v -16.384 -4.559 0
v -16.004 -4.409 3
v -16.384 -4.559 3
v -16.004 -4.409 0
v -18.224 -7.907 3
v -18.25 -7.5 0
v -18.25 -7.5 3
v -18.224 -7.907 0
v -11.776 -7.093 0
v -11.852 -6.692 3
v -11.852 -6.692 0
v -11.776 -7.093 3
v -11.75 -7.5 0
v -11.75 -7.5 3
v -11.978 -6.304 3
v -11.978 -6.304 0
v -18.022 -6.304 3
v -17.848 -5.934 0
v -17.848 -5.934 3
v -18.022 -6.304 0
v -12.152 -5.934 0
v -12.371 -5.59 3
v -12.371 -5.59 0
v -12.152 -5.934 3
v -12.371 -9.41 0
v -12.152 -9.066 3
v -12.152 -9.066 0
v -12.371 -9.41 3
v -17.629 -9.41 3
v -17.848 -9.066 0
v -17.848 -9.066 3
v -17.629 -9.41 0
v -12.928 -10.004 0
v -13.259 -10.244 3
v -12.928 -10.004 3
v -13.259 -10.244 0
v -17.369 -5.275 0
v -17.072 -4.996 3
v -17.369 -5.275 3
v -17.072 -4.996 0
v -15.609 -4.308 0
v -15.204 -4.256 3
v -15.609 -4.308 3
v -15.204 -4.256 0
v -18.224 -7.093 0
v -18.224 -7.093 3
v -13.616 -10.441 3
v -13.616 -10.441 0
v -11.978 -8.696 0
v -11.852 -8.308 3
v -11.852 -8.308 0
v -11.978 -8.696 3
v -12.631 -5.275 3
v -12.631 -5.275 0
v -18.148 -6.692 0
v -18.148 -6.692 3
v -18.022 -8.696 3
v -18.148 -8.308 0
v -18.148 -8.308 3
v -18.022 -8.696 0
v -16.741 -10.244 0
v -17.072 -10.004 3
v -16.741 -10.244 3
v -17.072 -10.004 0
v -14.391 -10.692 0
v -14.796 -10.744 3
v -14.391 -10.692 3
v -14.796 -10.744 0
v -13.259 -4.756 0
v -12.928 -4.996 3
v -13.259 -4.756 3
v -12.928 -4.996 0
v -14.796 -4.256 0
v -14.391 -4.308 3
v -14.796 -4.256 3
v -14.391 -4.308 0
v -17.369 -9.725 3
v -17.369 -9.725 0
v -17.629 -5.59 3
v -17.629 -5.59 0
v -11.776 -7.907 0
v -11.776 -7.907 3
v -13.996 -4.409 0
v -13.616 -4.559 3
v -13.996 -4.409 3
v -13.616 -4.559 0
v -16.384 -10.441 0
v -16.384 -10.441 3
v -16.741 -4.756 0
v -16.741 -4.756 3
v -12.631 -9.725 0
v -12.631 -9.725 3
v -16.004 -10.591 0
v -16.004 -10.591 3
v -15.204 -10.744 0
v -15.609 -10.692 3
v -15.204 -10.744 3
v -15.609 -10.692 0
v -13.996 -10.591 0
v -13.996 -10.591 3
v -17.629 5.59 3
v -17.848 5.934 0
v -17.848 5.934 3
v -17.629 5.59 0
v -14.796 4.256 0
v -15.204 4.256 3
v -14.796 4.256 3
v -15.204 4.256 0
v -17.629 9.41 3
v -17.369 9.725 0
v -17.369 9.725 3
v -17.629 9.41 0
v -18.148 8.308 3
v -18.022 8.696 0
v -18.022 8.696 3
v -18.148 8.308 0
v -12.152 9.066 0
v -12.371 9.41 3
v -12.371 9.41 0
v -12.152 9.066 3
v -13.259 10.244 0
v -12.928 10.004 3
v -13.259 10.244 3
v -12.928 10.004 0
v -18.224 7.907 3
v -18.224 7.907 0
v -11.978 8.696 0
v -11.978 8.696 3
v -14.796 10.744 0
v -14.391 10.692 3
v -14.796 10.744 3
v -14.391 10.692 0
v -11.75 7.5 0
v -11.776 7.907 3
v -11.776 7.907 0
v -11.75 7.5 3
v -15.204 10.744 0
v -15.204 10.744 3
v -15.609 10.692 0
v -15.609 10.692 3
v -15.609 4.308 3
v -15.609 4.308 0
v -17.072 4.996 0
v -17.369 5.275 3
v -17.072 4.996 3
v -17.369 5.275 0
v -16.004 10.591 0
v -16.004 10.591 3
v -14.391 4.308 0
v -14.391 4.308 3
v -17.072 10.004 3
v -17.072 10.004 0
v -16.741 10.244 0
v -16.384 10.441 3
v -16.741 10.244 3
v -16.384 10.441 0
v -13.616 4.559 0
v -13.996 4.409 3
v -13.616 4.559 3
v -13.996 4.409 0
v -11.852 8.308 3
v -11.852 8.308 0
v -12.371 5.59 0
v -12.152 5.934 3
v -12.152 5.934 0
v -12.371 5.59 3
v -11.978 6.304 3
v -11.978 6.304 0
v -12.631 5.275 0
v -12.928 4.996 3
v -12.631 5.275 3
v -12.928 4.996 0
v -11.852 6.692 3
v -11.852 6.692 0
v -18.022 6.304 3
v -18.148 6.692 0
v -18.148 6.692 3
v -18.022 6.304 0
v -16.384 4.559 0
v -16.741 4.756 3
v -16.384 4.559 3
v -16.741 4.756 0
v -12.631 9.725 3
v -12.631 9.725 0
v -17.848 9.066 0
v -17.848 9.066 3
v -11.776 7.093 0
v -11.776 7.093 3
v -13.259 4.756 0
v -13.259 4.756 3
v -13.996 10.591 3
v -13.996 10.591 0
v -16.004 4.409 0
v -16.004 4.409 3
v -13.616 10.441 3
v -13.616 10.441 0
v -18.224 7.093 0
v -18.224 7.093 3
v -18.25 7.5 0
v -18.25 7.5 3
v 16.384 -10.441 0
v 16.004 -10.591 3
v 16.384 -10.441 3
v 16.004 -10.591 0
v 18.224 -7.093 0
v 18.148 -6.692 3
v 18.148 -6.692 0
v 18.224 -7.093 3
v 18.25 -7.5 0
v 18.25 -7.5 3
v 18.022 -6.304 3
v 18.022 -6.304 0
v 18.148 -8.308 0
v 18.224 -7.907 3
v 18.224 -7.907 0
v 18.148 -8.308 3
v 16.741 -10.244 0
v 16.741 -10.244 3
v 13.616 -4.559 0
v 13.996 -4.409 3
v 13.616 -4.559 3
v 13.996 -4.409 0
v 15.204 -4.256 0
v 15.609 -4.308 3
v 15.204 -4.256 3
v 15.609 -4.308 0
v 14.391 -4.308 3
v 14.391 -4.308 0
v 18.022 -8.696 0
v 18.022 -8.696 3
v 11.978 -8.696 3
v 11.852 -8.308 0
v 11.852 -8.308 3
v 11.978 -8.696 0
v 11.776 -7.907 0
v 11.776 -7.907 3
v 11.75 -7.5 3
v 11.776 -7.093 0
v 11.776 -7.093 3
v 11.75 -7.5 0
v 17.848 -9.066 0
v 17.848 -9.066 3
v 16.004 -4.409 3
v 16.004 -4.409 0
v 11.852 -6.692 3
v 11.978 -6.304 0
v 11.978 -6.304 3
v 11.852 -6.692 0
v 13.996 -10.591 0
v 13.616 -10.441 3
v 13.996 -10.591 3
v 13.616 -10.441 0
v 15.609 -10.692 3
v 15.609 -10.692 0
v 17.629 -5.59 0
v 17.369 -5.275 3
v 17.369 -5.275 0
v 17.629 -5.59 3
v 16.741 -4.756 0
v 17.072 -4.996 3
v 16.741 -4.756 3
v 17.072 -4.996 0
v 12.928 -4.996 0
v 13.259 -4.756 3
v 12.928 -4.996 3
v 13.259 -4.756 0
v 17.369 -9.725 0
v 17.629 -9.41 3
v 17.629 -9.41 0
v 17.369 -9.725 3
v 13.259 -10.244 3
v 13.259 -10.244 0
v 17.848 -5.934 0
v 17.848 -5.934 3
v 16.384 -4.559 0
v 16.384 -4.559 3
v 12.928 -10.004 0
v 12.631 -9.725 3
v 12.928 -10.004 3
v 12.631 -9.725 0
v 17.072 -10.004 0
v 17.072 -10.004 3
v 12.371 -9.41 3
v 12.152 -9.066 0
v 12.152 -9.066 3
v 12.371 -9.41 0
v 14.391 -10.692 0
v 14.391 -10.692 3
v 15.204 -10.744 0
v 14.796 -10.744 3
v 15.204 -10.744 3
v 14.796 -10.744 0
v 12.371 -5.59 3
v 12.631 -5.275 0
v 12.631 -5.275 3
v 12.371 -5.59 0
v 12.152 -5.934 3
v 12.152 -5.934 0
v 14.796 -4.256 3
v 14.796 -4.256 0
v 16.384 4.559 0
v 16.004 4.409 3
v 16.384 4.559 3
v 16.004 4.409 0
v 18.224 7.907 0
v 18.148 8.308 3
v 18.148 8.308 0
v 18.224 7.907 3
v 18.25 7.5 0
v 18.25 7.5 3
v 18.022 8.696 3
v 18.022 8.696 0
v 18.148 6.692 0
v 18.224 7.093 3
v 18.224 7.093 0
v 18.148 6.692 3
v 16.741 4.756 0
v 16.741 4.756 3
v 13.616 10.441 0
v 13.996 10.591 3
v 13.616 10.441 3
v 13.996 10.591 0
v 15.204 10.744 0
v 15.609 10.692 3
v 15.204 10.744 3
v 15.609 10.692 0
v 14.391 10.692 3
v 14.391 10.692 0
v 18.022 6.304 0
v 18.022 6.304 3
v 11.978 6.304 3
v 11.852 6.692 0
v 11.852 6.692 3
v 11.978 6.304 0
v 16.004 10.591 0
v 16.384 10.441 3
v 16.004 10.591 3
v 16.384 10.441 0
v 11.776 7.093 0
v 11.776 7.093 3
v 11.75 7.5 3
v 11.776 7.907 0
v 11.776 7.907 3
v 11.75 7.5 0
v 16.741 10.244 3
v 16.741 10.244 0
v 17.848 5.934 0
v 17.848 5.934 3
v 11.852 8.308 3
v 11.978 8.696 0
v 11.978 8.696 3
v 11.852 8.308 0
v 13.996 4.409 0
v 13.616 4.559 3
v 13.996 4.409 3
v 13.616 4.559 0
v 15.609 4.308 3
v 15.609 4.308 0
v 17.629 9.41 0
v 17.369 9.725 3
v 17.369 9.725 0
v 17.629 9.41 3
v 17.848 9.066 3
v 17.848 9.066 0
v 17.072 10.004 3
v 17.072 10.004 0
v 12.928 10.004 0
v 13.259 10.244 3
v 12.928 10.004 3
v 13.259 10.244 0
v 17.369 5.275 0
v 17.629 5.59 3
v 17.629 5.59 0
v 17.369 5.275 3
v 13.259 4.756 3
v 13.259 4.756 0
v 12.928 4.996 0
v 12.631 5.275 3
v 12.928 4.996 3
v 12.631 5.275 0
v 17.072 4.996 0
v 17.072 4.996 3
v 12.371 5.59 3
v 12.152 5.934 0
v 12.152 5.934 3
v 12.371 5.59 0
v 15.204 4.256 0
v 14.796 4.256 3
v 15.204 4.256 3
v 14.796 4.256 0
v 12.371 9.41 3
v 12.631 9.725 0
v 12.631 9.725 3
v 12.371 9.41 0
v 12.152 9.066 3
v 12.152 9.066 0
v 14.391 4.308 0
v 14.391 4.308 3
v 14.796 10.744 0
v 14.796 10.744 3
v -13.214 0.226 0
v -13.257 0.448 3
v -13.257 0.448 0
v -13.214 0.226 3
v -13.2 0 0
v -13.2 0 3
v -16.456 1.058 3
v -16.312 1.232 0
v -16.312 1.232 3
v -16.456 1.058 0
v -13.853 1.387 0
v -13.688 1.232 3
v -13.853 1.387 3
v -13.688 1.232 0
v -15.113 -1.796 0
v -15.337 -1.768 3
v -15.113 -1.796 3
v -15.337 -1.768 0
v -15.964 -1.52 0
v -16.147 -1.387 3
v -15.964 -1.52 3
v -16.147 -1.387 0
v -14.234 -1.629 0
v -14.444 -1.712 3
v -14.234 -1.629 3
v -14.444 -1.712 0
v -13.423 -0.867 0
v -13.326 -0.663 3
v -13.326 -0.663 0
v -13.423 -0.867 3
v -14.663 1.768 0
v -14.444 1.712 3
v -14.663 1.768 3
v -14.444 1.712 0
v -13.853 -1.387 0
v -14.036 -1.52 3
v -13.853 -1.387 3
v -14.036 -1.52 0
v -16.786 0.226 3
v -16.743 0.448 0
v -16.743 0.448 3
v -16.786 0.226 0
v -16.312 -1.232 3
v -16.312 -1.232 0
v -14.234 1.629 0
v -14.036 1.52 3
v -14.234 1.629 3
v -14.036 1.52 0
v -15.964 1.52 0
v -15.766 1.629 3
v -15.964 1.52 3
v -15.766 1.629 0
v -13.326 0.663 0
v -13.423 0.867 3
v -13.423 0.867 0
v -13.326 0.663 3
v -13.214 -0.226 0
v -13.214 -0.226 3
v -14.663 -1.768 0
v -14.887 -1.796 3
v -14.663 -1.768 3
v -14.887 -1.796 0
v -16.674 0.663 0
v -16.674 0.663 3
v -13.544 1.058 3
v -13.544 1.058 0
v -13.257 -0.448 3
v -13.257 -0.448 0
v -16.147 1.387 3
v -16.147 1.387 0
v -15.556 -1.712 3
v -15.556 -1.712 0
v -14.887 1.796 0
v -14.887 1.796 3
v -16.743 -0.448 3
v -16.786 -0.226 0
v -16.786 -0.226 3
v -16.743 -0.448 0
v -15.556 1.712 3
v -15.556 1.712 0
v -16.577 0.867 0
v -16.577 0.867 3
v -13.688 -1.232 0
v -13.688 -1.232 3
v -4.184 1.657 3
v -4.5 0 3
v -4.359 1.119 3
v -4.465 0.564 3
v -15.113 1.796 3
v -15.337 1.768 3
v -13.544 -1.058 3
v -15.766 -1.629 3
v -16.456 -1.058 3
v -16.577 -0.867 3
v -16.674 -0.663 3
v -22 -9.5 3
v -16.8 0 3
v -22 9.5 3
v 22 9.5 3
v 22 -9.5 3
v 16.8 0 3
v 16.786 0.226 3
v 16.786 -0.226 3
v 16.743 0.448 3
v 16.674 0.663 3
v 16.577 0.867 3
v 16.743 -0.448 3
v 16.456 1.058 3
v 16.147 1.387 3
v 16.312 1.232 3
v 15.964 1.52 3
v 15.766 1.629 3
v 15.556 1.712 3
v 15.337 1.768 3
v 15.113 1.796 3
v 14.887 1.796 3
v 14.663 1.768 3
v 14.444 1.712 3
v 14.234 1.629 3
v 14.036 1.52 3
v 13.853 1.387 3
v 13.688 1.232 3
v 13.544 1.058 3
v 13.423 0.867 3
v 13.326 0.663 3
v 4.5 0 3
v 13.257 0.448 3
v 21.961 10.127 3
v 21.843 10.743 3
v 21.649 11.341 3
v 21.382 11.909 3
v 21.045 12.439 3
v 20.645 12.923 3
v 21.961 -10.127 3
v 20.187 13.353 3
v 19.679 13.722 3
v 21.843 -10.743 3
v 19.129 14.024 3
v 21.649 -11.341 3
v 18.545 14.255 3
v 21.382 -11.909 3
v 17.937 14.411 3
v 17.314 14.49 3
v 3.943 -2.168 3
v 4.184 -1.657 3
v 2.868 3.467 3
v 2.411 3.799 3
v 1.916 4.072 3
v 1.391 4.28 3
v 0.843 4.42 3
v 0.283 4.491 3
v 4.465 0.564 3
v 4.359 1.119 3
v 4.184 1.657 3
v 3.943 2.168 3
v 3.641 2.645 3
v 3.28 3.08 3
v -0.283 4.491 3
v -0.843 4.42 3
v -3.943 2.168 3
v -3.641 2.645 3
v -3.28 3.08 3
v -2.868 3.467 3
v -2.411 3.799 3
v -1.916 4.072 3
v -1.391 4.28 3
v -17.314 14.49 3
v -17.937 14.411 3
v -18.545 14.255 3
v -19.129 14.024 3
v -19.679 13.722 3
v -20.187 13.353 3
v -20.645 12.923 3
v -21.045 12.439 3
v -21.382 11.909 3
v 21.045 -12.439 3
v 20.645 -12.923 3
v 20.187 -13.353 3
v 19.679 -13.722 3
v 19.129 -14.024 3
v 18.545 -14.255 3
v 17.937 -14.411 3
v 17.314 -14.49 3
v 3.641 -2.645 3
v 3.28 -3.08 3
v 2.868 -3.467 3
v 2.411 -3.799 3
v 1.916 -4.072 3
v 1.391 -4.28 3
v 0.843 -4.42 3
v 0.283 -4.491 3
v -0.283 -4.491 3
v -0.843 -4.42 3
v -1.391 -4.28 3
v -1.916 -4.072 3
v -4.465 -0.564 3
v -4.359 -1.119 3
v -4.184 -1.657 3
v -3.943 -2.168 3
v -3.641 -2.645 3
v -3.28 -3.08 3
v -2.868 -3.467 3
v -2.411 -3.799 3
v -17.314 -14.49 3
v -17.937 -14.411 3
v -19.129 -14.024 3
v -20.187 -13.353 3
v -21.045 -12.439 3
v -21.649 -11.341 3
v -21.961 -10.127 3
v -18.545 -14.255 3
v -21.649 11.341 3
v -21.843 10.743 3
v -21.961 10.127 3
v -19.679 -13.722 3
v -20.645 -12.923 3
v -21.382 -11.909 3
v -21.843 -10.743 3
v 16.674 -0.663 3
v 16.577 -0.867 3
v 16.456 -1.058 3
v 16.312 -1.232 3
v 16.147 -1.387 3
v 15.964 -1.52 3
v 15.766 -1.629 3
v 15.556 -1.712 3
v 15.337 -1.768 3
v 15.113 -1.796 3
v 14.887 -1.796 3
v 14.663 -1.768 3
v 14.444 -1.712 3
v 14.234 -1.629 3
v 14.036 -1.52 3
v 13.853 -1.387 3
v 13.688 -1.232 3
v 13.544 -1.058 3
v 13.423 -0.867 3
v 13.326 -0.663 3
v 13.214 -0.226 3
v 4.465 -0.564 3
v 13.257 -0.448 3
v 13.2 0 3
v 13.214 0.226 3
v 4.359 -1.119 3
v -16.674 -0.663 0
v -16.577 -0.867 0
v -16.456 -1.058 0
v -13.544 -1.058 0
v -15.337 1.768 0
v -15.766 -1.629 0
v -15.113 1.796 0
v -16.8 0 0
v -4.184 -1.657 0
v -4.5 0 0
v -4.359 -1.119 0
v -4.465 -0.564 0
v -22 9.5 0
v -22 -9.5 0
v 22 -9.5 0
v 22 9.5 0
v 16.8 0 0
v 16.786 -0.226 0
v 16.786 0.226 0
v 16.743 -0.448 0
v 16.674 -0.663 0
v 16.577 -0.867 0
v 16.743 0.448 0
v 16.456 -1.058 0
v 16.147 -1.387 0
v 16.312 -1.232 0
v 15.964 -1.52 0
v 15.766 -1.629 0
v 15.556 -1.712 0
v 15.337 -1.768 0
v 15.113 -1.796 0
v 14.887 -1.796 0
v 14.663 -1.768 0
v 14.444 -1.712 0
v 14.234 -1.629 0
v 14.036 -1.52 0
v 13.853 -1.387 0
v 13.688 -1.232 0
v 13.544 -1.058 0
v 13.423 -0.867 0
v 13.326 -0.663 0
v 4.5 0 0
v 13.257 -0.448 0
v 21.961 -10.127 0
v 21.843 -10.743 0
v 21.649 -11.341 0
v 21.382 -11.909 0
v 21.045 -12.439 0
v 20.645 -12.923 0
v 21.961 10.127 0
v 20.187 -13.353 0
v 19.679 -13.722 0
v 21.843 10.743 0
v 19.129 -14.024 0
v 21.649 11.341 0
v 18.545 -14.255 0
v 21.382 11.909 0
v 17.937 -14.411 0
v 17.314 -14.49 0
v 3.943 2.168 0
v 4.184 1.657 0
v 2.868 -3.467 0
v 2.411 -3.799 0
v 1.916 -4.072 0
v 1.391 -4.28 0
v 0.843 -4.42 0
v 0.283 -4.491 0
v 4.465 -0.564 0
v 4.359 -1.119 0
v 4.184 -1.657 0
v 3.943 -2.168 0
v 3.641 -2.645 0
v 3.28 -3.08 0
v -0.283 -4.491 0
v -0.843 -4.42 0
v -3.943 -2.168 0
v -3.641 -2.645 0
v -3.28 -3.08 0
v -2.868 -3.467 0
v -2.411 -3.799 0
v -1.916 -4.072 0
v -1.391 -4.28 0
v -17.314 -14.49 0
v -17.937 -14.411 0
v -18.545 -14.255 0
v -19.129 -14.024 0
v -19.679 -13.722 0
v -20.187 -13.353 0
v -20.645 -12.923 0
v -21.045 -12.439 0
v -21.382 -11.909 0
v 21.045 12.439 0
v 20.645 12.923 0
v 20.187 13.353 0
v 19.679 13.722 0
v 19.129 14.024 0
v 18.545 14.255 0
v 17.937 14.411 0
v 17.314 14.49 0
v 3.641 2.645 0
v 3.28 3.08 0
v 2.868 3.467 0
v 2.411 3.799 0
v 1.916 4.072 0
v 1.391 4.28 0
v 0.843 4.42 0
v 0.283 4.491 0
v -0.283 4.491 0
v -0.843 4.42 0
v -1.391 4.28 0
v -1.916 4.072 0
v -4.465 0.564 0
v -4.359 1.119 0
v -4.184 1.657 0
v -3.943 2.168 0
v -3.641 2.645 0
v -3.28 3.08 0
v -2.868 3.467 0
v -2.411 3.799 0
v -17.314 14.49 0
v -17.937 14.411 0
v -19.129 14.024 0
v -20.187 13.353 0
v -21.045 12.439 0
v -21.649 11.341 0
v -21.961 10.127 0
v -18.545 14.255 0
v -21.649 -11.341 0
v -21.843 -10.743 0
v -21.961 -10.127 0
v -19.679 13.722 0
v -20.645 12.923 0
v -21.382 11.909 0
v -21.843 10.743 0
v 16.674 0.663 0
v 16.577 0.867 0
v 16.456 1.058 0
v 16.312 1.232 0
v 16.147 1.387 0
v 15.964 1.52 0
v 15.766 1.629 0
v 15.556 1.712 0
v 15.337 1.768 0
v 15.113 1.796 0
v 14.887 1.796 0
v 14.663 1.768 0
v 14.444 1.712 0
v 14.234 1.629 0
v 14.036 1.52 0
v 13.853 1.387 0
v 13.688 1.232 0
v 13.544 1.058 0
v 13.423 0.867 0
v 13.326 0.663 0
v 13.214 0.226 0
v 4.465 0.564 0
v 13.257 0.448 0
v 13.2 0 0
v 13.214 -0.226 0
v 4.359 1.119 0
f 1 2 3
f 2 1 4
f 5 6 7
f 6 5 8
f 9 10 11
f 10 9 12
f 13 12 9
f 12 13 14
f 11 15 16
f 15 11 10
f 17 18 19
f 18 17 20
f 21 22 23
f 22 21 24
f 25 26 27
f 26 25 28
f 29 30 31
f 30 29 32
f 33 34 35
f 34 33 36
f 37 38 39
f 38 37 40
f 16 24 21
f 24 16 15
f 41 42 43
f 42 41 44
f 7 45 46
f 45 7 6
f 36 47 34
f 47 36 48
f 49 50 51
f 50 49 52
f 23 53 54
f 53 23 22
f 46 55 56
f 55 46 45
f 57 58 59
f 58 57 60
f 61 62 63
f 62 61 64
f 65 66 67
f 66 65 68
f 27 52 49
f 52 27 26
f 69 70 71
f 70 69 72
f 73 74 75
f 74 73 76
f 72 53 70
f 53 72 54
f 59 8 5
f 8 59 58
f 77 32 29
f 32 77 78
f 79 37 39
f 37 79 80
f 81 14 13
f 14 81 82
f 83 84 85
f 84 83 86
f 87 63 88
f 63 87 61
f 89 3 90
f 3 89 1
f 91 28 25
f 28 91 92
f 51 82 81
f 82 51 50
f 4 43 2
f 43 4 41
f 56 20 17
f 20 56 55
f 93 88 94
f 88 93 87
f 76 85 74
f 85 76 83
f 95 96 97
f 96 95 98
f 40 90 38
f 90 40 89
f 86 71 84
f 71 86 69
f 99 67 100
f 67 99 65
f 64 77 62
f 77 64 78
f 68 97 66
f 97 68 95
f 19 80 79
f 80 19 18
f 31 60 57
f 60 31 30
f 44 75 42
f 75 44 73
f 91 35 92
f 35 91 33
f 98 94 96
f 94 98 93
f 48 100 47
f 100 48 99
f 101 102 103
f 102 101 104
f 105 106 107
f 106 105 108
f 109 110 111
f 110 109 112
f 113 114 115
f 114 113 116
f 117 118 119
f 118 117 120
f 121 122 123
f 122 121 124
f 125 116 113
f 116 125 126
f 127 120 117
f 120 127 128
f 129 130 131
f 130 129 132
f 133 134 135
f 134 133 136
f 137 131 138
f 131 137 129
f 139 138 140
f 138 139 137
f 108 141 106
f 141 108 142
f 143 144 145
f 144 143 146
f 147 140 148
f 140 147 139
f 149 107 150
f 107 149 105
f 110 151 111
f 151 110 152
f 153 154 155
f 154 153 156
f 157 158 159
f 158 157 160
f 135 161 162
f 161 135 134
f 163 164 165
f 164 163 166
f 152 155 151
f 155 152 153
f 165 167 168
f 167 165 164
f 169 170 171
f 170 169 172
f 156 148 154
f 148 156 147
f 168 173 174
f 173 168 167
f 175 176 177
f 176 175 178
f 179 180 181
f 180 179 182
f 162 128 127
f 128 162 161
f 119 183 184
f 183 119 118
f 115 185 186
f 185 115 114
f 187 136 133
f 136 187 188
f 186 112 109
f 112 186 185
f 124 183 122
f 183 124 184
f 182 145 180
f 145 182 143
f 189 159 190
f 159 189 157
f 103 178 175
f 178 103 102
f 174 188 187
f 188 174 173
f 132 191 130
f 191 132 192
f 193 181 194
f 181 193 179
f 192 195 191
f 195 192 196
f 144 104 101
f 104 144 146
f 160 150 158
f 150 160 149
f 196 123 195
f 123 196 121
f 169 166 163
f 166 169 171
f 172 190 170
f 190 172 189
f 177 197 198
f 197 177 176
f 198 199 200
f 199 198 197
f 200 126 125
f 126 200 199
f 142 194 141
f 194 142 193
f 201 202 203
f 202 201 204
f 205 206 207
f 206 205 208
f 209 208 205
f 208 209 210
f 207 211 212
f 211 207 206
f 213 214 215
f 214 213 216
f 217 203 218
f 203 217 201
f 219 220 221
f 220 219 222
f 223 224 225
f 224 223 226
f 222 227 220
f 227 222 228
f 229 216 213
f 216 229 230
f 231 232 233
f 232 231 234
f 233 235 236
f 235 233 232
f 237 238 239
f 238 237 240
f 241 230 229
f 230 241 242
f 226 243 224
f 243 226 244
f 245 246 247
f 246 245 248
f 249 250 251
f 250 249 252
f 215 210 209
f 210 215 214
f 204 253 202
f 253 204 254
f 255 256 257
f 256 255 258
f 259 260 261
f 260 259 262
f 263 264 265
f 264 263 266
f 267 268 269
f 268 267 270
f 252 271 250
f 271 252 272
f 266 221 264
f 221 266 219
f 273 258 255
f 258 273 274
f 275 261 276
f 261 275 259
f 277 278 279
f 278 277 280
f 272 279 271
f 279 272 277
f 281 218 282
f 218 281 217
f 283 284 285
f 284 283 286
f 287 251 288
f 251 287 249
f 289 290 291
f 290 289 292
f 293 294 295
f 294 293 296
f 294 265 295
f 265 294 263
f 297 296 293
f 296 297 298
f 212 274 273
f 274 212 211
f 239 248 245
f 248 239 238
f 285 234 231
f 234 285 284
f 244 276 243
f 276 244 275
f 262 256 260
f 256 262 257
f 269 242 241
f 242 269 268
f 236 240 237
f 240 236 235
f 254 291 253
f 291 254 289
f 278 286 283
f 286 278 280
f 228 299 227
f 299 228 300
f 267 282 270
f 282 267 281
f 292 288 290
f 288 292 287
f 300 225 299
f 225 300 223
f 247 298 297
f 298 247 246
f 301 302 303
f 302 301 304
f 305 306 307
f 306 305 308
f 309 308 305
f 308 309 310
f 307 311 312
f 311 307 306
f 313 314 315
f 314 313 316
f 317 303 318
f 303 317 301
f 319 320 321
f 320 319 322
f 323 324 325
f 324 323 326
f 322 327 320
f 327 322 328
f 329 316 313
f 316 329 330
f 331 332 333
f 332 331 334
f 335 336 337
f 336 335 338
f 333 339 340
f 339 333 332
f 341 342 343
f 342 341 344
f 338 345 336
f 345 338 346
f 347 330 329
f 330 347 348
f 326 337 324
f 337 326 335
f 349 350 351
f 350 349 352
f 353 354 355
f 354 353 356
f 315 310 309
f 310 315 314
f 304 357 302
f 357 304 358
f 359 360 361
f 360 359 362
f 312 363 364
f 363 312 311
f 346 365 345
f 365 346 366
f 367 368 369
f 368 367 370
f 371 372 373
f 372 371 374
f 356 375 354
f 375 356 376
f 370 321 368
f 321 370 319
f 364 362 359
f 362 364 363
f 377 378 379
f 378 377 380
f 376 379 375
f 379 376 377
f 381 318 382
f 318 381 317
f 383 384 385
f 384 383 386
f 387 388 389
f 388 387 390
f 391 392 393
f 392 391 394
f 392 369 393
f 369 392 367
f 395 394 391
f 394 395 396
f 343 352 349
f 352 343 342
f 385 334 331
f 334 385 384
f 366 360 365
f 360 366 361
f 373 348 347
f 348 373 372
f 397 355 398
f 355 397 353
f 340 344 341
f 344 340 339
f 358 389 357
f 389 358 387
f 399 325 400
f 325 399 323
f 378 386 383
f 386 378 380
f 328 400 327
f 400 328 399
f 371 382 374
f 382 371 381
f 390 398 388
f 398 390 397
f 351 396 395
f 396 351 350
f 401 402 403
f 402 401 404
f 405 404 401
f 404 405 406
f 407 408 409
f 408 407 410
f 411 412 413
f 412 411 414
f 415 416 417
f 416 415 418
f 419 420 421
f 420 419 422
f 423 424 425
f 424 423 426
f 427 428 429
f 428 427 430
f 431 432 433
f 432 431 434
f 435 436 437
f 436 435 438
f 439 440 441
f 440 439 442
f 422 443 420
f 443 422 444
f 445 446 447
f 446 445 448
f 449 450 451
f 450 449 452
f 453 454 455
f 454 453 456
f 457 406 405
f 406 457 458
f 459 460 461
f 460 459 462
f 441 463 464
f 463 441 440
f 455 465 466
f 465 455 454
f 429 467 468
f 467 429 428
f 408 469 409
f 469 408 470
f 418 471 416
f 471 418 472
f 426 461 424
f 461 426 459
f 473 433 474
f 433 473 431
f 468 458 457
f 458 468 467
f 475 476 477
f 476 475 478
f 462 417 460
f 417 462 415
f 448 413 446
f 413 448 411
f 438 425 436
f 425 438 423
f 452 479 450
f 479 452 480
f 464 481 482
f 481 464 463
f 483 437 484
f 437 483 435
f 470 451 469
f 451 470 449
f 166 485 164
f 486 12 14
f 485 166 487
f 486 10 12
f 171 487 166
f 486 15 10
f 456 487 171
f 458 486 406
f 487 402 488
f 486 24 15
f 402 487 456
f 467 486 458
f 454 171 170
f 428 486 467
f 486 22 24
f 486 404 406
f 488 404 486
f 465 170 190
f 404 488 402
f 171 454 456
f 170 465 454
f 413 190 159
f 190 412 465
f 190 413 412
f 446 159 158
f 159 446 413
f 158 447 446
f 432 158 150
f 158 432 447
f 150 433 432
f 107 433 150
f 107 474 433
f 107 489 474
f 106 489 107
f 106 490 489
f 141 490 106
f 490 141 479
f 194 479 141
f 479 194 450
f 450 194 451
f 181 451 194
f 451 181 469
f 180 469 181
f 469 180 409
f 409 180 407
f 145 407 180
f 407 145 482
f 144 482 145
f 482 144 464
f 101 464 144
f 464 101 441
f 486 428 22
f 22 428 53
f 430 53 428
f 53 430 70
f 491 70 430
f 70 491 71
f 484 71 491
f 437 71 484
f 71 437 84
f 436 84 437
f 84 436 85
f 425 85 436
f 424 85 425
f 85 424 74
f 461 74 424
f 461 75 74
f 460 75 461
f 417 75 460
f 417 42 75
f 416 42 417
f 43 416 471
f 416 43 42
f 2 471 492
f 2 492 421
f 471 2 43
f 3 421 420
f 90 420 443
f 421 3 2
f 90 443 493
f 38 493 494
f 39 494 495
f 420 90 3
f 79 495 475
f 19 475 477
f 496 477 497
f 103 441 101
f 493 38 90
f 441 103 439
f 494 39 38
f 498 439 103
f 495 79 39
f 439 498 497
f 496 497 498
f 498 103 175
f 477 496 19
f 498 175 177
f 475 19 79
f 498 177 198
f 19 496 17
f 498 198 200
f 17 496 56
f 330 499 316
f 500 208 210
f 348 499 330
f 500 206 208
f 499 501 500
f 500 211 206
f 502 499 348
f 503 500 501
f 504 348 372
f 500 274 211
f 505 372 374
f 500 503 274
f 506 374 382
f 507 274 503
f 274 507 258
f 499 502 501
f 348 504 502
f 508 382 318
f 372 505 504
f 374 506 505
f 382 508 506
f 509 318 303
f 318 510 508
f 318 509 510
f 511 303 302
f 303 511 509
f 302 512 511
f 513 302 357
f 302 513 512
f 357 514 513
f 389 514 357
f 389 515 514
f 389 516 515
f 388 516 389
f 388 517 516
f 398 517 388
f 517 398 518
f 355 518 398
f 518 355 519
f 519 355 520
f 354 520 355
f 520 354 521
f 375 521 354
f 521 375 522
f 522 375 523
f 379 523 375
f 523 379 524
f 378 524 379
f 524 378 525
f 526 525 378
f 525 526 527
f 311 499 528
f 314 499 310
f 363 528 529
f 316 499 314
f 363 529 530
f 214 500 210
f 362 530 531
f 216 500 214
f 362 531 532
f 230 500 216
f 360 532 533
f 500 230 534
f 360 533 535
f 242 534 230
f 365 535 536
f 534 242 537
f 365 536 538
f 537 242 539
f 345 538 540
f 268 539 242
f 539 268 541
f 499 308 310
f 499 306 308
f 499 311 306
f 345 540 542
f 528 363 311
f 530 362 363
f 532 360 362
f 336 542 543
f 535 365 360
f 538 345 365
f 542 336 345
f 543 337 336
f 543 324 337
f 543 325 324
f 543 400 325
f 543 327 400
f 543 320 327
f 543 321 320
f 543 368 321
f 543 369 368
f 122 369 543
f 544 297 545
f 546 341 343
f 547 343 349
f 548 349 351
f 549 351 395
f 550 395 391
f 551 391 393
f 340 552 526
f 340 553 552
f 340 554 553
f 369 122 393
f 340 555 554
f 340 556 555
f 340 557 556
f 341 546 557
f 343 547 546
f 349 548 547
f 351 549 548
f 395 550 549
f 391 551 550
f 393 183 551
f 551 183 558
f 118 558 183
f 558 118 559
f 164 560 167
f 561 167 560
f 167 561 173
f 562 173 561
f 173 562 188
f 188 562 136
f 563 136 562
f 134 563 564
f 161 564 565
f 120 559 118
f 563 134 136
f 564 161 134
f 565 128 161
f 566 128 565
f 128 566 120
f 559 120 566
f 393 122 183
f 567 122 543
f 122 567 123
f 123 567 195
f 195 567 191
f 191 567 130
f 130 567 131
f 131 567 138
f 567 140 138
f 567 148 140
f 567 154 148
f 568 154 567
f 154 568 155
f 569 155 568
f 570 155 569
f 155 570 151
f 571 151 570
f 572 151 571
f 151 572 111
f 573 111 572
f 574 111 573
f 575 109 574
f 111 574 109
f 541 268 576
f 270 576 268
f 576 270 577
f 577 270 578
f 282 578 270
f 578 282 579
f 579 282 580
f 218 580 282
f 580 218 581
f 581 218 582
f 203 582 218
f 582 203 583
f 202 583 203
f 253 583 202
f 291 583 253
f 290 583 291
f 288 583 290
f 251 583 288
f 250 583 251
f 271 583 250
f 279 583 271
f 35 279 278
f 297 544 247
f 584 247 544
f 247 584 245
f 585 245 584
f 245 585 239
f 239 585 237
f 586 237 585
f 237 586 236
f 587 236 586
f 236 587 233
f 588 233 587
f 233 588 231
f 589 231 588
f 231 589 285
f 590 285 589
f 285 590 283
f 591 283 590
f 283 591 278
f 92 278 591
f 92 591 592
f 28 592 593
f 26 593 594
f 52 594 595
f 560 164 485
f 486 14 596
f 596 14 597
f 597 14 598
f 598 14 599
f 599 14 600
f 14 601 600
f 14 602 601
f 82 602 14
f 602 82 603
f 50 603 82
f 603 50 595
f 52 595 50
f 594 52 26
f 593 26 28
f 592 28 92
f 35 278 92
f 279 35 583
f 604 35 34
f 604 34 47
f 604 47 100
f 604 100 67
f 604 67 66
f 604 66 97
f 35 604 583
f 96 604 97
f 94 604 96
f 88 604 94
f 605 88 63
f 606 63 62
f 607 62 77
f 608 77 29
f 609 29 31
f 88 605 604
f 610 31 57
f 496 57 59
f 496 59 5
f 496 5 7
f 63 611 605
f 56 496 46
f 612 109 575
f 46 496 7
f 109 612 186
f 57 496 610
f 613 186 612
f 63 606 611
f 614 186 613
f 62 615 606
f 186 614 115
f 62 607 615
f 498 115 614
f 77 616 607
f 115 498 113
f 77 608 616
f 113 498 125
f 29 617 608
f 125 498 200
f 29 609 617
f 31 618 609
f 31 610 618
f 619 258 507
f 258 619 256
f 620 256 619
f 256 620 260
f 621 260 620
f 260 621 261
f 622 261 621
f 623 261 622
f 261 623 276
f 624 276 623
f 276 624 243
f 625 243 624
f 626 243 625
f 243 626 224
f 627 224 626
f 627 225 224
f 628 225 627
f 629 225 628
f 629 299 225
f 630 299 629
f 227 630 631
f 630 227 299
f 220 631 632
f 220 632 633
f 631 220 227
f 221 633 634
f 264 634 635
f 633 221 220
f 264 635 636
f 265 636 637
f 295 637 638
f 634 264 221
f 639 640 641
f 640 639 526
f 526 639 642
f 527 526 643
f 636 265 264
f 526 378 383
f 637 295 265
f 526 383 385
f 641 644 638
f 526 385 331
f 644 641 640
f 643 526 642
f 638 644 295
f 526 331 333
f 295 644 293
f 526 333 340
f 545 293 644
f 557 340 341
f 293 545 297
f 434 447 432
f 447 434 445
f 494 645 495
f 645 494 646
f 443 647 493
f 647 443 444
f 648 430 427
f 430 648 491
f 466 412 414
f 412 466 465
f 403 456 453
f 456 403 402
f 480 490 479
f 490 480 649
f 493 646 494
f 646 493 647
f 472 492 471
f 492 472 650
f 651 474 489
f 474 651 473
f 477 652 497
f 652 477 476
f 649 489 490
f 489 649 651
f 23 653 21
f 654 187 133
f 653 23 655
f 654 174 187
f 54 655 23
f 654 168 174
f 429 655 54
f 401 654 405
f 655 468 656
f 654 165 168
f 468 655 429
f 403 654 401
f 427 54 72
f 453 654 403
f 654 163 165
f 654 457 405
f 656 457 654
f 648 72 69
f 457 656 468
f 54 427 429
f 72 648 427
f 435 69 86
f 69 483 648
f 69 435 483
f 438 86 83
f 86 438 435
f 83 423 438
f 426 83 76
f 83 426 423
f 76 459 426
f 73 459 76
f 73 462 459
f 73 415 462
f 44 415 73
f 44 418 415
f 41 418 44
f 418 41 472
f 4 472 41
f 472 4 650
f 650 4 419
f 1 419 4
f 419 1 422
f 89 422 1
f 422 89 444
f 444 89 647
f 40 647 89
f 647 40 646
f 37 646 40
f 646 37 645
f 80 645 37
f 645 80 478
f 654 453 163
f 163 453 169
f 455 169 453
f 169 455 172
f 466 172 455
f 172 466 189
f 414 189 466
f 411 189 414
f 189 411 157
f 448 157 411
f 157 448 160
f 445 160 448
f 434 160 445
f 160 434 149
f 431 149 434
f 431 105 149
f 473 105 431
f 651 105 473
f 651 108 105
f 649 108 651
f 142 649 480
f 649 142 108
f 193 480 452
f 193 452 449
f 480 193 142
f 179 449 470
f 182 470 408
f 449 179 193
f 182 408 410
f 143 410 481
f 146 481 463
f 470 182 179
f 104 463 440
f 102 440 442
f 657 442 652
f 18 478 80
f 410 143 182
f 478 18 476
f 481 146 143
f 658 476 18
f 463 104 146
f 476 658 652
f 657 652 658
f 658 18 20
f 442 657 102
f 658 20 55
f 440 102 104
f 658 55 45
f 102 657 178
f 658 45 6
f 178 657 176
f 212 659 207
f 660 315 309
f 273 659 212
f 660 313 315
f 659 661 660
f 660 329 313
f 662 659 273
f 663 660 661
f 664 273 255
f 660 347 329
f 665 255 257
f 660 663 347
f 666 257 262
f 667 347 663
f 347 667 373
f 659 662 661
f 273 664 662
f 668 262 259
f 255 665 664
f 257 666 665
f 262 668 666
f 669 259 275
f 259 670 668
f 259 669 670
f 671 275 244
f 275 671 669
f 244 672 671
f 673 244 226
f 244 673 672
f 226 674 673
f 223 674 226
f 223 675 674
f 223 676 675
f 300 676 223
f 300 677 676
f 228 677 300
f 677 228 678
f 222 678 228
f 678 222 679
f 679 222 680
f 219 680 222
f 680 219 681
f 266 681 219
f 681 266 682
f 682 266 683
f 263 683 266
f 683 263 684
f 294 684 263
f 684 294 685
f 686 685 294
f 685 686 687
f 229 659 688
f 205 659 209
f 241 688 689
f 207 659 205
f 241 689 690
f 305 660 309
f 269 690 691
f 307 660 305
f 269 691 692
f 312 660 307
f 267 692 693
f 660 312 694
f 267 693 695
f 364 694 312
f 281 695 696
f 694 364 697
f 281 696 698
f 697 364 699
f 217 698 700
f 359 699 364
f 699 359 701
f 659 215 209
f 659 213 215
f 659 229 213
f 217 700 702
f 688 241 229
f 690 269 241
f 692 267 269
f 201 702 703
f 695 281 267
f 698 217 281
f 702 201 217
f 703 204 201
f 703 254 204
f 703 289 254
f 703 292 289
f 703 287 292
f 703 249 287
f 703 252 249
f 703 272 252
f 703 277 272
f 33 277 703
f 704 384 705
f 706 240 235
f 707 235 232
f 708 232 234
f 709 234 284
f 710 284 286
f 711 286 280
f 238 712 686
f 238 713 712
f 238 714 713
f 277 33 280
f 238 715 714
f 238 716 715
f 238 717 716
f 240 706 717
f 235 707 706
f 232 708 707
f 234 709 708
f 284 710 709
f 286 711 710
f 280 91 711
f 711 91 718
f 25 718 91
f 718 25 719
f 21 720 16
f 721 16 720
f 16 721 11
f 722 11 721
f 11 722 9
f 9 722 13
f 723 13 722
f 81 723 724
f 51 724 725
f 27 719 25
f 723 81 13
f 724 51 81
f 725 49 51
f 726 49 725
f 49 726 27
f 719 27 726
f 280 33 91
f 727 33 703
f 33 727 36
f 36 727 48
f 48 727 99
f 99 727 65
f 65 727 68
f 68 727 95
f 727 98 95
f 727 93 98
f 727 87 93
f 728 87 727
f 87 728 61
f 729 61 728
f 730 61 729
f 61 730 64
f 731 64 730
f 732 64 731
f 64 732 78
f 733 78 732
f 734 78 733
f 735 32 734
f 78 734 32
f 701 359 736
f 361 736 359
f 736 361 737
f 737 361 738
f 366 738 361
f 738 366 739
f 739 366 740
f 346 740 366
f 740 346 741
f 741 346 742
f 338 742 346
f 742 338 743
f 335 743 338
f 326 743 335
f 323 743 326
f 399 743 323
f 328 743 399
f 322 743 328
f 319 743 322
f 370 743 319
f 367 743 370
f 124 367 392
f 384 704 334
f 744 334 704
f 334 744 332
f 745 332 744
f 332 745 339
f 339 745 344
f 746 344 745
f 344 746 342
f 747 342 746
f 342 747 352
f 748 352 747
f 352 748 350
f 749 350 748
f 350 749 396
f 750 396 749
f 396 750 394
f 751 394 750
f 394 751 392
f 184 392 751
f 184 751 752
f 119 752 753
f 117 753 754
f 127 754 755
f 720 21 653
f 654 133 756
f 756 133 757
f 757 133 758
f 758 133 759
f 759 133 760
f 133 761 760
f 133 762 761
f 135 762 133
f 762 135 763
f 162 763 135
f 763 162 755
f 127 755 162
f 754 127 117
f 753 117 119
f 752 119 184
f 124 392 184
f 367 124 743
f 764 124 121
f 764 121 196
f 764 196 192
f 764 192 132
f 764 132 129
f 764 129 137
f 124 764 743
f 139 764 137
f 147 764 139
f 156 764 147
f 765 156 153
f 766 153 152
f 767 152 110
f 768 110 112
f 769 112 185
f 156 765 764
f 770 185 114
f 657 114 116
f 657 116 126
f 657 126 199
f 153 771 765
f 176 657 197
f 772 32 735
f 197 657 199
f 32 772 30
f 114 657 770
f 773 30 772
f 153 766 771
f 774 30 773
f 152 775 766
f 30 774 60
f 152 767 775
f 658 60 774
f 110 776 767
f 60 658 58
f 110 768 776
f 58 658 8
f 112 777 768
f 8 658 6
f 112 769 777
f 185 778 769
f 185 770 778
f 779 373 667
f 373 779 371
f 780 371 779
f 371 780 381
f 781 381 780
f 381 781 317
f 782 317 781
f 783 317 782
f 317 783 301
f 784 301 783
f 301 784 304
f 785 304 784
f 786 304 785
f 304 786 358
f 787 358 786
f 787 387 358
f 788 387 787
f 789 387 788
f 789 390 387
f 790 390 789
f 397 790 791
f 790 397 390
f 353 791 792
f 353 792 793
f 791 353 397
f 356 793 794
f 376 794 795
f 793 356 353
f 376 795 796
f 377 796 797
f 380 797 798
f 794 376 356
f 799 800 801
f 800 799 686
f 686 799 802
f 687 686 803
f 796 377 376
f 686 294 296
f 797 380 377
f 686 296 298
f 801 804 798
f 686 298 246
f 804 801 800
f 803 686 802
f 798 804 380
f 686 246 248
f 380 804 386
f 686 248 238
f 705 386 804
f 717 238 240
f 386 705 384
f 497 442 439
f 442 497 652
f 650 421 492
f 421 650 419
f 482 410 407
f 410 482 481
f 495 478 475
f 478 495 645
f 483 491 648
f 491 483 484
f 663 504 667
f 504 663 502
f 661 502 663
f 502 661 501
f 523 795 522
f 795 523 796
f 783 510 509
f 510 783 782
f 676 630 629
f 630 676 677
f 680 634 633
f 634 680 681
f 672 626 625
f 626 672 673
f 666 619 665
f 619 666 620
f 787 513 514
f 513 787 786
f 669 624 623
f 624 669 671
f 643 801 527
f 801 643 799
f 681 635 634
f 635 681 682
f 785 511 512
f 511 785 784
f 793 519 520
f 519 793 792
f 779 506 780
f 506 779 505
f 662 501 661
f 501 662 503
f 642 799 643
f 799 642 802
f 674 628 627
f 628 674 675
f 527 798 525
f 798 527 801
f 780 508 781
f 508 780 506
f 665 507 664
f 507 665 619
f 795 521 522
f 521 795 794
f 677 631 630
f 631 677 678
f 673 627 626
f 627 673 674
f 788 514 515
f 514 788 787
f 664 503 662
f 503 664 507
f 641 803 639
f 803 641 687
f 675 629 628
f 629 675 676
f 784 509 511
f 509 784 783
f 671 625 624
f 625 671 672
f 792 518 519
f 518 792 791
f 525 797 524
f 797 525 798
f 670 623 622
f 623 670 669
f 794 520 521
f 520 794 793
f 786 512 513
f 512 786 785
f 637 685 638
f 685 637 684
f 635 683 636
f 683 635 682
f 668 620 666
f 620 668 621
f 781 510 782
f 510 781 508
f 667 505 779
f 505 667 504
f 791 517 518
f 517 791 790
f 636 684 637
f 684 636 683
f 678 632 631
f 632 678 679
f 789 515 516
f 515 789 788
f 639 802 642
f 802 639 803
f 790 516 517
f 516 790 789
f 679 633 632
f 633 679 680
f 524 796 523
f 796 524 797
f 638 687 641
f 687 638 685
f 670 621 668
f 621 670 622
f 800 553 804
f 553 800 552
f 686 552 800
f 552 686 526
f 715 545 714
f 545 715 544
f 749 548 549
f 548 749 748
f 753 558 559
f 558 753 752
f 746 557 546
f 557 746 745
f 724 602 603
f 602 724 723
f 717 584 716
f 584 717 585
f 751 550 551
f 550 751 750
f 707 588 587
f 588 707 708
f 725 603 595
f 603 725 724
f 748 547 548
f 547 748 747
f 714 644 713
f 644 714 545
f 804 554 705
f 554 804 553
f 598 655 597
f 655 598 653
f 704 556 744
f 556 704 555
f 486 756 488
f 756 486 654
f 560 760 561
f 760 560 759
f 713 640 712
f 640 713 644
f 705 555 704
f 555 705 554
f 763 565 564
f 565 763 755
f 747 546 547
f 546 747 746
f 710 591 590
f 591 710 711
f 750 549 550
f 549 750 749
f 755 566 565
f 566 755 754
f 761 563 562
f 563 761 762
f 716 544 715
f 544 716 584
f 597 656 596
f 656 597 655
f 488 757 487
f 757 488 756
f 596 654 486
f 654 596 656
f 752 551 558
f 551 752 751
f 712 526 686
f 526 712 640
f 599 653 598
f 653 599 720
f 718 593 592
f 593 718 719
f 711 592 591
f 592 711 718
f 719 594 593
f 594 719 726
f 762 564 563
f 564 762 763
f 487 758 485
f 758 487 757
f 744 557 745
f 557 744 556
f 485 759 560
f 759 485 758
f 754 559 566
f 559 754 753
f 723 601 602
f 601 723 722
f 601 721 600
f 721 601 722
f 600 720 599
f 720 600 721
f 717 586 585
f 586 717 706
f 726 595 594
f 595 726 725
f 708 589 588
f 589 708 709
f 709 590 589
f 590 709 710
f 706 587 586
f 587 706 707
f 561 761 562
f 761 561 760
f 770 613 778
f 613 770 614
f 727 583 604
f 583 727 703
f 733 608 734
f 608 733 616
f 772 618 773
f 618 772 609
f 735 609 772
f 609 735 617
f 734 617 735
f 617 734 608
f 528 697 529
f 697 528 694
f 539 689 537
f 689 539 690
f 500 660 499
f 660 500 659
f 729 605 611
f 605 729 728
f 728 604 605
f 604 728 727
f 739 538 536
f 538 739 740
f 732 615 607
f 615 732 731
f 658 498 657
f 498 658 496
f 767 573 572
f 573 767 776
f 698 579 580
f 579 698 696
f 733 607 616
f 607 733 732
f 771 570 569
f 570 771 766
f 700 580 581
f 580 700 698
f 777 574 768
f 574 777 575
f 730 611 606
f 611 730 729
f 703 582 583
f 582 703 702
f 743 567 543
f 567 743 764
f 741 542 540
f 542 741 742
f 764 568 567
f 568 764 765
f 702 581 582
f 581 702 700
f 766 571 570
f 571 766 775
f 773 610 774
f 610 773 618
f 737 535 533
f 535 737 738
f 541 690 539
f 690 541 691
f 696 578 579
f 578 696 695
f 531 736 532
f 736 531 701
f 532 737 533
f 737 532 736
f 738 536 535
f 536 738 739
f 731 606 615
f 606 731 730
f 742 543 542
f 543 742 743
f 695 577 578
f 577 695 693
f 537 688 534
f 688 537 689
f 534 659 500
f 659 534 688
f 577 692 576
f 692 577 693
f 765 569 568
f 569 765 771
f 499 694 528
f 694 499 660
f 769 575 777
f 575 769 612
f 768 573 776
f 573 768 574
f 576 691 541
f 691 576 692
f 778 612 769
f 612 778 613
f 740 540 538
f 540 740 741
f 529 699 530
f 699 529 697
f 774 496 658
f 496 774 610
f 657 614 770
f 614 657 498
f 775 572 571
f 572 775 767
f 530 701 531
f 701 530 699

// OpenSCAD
$fn = 50;


difference() {
	union() {
		hull() {
			translate(v = [-17.0000000000, 9.5000000000, 0]) {
				cylinder(h = 3, r = 5);
			}
			translate(v = [17.0000000000, 9.5000000000, 0]) {
				cylinder(h = 3, r = 5);
			}
			translate(v = [-17.0000000000, -9.5000000000, 0]) {
				cylinder(h = 3, r = 5);
			}
			translate(v = [17.0000000000, -9.5000000000, 0]) {
				cylinder(h = 3, r = 5);
			}
		}
	}
	union() {
		#translate(v = [-15.0000000000, -7.5000000000, 0]) {
			cylinder(h = 3, r = 3.2500000000);
		}
		#translate(v = [-15.0000000000, 7.5000000000, 0]) {
			cylinder(h = 3, r = 3.2500000000);
		}
		#translate(v = [15.0000000000, -7.5000000000, 0]) {
			cylinder(h = 3, r = 3.2500000000);
		}
		#translate(v = [15.0000000000, 7.5000000000, 0]) {
			cylinder(h = 3, r = 3.2500000000);
		}
		#translate(v = [-15.0000000000, -7.5000000000, -100.0000000000]) {
			cylinder(h = 200, r = 3.2500000000);
		}
		#translate(v = [-15.0000000000, 7.5000000000, -100.0000000000]) {
			cylinder(h = 200, r = 3.2500000000);
		}
		#translate(v = [15.0000000000, -7.5000000000, -100.0000000000]) {
			cylinder(h = 200, r = 3.2500000000);
		}
		#translate(v = [15.0000000000, 7.5000000000, -100.0000000000]) {
			cylinder(h = 200, r = 3.2500000000);
		}
		#translate(v = [-15.0000000000, -7.5000000000, 0]) {
			cylinder(h = 3, r = 1.8000000000);
		}
		#translate(v = [-15.0000000000, 0.0000000000, 0]) {
			cylinder(h = 3, r = 1.8000000000);
		}
		#translate(v = [-15.0000000000, 7.5000000000, 0]) {
			cylinder(h = 3, r = 1.8000000000);
		}
		#translate(v = [15.0000000000, -7.5000000000, 0]) {
			cylinder(h = 3, r = 1.8000000000);
		}
		#translate(v = [15.0000000000, 0.0000000000, 0]) {
			cylinder(h = 3, r = 1.8000000000);
		}
		#translate(v = [15.0000000000, 7.5000000000, 0]) {
			cylinder(h = 3, r = 1.8000000000);
		}
		#translate(v = [-15.0000000000, -7.5000000000, 0]) {
			cylinder(h = 3, r = 1.8000000000);
		}
		#translate(v = [-15.0000000000, 0.0000000000, 0]) {
			cylinder(h = 3, r = 1.8000000000);
		}
		#translate(v = [-15.0000000000, 7.5000000000, 0]) {
			cylinder(h = 3, r = 1.8000000000);
		}
		#translate(v = [15.0000000000, -7.5000000000, 0]) {
			cylinder(h = 3, r = 1.8000000000);
		}
		#translate(v = [15.0000000000, 0.0000000000, 0]) {
			cylinder(h = 3, r = 1.8000000000);
		}
		#translate(v = [15.0000000000, 7.5000000000, 0]) {
			cylinder(h = 3, r = 1.8000000000);
		}
		#translate(v = [-15.0000000000, -7.5000000000, 0]) {
			cylinder(h = 3, r = 1.8000000000);
		}
		#translate(v = [-15.0000000000, 0.0000000000, 0]) {
			cylinder(h = 3, r = 1.8000000000);
		}
		#translate(v = [-15.0000000000, 7.5000000000, 0]) {
			cylinder(h = 3, r = 1.8000000000);
		}
		#translate(v = [15.0000000000, -7.5000000000, 0]) {
			cylinder(h = 3, r = 1.8000000000);
		}
		#translate(v = [15.0000000000, 0.0000000000, 0]) {
			cylinder(h = 3, r = 1.8000000000);
		}
		#translate(v = [15.0000000000, 7.5000000000, 0]) {
			cylinder(h = 3, r = 1.8000000000);
		}
		#cylinder(h = 3, r = 4.5000000000);
	}
}
